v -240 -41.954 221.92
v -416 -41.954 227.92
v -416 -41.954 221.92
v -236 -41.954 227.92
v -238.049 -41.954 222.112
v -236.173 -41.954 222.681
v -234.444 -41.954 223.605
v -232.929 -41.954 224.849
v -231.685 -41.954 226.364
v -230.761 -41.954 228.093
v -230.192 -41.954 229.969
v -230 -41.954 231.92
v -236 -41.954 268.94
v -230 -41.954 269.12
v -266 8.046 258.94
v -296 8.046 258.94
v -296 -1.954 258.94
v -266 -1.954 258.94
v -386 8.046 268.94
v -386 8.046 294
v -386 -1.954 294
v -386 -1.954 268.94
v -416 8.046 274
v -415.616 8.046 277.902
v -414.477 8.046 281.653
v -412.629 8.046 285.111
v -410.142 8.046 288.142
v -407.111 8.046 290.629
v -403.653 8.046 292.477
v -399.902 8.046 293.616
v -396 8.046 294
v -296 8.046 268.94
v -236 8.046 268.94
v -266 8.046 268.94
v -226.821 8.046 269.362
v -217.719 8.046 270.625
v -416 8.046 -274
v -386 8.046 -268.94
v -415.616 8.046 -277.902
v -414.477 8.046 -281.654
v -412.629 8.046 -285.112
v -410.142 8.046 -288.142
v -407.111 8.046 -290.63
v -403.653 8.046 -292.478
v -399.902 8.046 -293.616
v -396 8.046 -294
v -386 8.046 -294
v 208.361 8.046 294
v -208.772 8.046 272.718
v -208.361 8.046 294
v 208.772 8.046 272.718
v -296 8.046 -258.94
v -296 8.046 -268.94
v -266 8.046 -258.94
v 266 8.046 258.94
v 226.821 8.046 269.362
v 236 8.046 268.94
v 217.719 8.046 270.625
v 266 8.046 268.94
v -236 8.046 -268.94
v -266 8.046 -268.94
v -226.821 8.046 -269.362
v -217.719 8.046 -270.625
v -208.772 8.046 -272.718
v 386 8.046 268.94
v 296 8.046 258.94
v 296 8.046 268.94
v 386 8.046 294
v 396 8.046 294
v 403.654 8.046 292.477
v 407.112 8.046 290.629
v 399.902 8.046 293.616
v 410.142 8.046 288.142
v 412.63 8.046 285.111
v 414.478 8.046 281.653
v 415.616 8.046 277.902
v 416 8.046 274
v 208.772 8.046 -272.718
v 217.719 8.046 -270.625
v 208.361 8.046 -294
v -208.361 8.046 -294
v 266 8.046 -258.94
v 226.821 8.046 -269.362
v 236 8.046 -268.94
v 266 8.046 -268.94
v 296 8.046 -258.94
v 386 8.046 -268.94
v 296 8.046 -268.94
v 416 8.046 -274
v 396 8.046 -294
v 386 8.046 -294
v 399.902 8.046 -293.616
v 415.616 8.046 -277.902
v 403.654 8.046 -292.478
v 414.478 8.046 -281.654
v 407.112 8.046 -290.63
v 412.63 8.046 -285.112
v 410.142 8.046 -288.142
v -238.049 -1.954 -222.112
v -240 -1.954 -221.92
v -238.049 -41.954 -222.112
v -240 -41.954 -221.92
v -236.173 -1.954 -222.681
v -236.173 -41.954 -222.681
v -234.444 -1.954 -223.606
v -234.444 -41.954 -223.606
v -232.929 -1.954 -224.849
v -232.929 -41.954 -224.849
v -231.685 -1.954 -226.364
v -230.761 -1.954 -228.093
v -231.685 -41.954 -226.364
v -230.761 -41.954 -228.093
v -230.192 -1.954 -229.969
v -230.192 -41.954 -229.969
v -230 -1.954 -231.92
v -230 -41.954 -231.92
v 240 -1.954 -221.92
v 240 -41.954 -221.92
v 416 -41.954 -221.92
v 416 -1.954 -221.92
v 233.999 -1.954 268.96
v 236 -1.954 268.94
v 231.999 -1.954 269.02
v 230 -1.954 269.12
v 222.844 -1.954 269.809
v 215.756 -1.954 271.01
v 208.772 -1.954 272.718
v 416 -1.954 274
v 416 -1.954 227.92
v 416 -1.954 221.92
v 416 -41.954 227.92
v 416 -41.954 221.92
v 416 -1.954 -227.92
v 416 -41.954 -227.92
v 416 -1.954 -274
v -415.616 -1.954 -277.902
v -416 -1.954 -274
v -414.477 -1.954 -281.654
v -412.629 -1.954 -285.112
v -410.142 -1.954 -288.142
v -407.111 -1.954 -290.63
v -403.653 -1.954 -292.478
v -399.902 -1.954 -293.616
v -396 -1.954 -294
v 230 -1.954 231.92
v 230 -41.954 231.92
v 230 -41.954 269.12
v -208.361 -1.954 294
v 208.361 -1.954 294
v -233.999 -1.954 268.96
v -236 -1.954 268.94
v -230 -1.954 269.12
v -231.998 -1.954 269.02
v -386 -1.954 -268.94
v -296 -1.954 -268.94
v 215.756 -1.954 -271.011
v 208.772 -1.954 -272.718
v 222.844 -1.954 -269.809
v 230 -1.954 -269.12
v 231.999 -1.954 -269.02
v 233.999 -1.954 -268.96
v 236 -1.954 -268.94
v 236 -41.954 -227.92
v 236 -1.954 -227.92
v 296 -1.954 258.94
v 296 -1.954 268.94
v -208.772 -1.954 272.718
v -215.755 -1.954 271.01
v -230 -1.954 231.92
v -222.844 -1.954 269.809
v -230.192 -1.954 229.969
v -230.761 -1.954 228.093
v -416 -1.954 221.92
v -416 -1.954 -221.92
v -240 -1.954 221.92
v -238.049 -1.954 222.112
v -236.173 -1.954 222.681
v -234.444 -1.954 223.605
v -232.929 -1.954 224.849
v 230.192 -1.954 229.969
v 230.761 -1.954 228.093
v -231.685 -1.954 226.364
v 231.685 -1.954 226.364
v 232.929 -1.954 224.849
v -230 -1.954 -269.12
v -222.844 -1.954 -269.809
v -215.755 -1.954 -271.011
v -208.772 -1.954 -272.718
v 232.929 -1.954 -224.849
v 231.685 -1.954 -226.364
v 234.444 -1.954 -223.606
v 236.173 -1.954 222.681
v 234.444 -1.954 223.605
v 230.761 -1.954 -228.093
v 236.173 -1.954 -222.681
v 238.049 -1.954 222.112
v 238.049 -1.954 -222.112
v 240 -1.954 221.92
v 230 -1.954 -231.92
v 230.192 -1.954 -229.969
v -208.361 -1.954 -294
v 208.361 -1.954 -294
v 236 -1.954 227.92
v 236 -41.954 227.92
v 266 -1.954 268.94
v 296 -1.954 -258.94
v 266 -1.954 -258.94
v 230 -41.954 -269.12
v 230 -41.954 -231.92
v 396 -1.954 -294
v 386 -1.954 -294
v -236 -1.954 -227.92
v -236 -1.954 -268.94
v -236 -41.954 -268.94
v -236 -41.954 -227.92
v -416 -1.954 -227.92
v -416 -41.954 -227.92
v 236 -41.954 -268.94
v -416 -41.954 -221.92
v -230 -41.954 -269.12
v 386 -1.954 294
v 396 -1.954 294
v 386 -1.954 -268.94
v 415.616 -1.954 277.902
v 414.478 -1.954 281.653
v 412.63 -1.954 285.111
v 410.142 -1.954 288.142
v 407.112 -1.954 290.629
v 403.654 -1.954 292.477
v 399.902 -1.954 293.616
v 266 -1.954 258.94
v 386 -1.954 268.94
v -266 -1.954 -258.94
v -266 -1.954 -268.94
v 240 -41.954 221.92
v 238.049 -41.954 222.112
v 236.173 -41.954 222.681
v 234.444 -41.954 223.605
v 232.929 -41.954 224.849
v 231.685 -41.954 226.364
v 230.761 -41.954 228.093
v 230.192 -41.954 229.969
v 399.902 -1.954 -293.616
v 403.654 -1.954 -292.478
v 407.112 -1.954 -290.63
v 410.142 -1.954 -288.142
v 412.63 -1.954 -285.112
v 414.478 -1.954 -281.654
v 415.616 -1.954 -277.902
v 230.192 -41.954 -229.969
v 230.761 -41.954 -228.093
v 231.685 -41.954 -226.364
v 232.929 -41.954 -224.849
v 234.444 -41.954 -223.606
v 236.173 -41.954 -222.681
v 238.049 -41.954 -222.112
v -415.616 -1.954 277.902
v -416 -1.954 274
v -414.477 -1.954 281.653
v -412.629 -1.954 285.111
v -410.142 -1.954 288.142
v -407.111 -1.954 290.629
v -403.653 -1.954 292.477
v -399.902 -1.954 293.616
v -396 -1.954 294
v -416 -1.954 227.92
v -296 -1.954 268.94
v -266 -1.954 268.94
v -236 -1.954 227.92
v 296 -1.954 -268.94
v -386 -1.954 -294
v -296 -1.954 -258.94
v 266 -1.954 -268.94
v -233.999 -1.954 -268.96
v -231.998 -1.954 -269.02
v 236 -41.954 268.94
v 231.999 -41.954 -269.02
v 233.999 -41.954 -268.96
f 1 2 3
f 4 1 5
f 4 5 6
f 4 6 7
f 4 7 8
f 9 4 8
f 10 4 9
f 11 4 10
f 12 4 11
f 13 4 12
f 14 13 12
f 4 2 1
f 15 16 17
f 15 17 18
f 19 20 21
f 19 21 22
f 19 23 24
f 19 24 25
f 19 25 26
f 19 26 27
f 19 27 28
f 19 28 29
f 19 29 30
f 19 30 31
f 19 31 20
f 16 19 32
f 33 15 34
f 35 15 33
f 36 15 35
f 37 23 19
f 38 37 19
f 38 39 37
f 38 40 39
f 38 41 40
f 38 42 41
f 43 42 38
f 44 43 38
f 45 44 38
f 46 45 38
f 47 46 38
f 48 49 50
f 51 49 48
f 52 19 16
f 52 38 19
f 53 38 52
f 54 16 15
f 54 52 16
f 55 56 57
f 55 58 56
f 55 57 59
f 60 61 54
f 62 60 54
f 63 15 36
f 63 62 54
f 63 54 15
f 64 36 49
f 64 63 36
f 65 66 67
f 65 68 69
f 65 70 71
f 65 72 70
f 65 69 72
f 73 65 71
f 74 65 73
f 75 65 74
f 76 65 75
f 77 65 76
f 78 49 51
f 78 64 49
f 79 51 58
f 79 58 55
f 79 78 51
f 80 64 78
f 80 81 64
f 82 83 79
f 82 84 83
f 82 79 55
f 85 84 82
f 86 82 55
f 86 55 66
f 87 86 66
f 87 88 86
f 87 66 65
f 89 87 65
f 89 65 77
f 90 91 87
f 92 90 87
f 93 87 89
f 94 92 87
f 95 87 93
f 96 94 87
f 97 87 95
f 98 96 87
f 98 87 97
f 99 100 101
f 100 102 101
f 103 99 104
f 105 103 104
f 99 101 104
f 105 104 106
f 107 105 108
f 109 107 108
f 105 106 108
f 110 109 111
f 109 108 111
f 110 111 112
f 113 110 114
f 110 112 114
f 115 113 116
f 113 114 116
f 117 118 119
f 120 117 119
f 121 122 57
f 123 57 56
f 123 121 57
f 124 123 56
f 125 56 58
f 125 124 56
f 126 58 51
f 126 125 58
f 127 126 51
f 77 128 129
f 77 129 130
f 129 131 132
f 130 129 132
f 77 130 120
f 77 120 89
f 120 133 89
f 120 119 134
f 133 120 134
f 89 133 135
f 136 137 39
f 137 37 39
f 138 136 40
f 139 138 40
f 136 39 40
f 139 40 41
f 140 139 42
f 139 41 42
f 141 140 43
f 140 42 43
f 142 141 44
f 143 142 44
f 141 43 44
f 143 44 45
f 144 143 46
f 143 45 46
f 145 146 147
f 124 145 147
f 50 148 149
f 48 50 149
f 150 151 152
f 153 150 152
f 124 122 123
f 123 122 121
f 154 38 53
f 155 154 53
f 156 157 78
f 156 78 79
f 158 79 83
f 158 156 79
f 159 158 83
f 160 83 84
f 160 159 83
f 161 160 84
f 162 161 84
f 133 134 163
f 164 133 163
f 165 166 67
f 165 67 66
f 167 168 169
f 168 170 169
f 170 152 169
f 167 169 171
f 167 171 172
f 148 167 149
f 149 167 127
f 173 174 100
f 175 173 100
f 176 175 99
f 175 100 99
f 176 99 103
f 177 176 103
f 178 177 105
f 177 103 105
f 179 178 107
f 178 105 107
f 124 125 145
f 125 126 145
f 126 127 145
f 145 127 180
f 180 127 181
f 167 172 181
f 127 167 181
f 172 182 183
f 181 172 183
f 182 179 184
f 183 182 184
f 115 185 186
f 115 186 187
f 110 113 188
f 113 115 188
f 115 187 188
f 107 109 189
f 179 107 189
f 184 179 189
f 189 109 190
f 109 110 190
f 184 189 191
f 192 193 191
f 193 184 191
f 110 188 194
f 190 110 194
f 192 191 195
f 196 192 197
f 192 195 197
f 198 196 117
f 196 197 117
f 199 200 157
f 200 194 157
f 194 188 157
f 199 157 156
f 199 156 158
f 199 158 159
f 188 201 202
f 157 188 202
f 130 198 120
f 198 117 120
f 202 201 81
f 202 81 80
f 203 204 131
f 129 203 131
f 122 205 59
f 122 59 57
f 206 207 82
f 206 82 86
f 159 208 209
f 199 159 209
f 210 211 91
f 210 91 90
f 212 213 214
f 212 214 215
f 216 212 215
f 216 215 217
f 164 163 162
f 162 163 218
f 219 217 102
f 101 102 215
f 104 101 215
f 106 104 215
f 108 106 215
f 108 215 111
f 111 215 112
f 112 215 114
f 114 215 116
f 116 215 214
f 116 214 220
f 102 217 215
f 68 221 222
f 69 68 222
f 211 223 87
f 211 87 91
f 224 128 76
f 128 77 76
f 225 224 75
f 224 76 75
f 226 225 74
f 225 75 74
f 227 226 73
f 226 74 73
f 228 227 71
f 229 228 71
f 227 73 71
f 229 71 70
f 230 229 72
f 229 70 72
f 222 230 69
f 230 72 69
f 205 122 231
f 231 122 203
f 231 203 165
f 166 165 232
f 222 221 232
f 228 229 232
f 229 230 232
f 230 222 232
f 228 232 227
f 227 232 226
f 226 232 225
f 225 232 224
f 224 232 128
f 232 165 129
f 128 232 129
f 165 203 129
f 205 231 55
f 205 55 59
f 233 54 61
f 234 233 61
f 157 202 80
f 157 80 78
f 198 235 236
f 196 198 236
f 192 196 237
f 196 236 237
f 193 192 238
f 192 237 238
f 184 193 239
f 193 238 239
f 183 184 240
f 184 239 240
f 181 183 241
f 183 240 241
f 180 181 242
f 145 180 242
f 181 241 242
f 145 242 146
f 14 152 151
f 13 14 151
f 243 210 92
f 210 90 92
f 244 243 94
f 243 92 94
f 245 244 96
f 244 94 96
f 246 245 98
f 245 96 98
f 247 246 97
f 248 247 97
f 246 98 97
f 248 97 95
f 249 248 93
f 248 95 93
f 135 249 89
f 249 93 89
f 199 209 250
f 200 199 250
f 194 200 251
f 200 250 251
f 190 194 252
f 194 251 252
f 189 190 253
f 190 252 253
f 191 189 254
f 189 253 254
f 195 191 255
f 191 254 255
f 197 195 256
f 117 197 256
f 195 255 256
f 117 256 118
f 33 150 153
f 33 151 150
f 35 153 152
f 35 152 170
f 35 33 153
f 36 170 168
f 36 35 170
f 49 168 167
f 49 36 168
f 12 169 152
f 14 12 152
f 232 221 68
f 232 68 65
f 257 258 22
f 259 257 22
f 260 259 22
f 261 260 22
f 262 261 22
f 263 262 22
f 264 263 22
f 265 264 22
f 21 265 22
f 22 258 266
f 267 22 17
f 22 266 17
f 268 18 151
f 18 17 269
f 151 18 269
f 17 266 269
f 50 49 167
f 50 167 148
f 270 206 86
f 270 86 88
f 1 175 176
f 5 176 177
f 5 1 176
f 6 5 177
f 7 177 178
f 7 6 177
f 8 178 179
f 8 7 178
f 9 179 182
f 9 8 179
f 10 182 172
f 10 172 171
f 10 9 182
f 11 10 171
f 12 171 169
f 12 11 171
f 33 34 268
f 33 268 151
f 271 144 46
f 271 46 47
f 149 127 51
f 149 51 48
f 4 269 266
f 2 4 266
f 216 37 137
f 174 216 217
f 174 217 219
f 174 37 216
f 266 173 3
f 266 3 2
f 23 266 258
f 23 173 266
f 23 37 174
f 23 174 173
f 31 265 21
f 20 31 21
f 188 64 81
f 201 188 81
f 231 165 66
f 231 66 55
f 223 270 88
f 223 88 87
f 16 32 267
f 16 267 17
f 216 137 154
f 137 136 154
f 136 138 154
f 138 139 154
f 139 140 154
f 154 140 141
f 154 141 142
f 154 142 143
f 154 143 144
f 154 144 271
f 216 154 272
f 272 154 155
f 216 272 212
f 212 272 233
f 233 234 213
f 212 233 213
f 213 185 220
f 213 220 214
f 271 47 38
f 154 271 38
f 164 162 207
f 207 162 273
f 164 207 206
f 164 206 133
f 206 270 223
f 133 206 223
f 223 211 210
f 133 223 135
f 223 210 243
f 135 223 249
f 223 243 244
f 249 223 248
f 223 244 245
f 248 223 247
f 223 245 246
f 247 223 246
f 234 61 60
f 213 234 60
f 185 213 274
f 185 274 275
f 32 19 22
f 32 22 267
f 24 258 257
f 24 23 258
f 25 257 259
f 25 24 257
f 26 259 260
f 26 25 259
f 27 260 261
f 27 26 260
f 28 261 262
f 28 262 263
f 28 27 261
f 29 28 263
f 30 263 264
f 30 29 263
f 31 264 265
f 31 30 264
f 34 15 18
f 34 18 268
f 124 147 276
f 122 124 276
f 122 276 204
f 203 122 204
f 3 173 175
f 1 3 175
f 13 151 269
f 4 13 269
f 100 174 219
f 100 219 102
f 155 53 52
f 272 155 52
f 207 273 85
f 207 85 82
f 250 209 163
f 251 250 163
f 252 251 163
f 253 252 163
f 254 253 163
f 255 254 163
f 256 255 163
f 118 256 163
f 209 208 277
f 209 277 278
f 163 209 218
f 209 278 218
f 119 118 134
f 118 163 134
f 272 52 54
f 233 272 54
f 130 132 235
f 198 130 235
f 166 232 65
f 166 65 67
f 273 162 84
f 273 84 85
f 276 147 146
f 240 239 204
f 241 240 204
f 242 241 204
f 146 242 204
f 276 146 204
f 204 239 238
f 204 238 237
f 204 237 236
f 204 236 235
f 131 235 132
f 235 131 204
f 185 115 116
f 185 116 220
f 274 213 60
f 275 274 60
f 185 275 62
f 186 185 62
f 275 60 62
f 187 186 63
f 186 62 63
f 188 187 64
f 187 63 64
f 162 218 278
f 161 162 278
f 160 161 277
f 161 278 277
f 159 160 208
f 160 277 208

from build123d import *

# Parameters (mm, degrees)
CROQUIS1_W               = 416
CROQUIS1_H               = 294
SALIENTE_EXTRUIR1_DEPTH  = 5
CORTAR_EXTRUIR1_DEPTH    = 255.750858684
REDONDEO1_R              = 10
SALIENTE_EXTRUIR3_DEPTH  = 20
REDONDEO2_R              = 5
REDONDEO2_OF_SIMETR_A3_R = 5
SIMETR_A4_DEPTH          = 5
SIMETR_A4_START          = -20
SIMETR_A4_2_DEPTH        = 20
ESCALA1_SCALE            = 2


# Read off the part's stored shape, not the designer's step: Simetría4
with BuildPart() as part:
    # Croquis1 → Saliente-Extruir1 (new body)
    with BuildSketch(Plane(origin=(0, 0, 0), x_dir=(1, 0, 0), z_dir=(0, 1, 0))):
        Rectangle(CROQUIS1_W, CROQUIS1_H)
    extrude(amount=SALIENTE_EXTRUIR1_DEPTH)

    # Croquis3 → Cortar-Extruir1 (cut, through all)
    with BuildSketch(Plane(origin=(0, 5, 0), x_dir=(1, 0, 0), z_dir=(0, 1, 0))):
        with BuildLine():
            Line((-193, 154.47), (-193, 134.47))
            Line((-193, 134.47), (-148, 134.47))
            Line((-148, 134.47), (-148, 129.47))
            Line((-148, 129.47), (-133, 129.47))
            Line((-133, 129.47), (-133, 134.47))
            Line((-133, 134.47), (-118, 134.47))
            ThreePointArc((-118, 134.47), (-111.127739024, 134.944531511), (-104.385922224, 136.359118837))
            Line((-104.385922224, 136.359118837), (-104, 156.355395091))
            Line((-104, 156.355395091), (-193, 156.355395091))
            Line((-193, 156.355395091), (-193, 154.47))
        make_face()
    cortar_extruir1 = extrude(amount=-CORTAR_EXTRUIR1_DEPTH, mode=Mode.SUBTRACT)

    # Simetría1: Cortar-Extruir1 across plane
    add(cortar_extruir1.mirror(Plane.XY), mode=Mode.SUBTRACT)

    # Redondeo1
    redondeo1_edges = [part.edges().sort_by_distance(p)[0] for p in [
        (-208, 2.5, -147),
        (208, 2.5, -147),
        (208, 2.5, 147),
        (-208, 2.5, 147),
    ]]
    fillet(redondeo1_edges, radius=REDONDEO1_R)

    # Croquis5 → Saliente-Extruir3 (add)
    with BuildSketch(Plane.XZ):
        Polygon((-208, 110.96), (-115, 110.96), (-115, 134.560081146), (-118, 134.47), (-118, 113.96), (-208, 113.96), align=None)
    saliente_extruir3 = extrude(amount=SALIENTE_EXTRUIR3_DEPTH)

    # Redondeo2
    redondeo2_edges = [part.edges().sort_by_distance(p)[0] for p in [
        (-115, -10, 110.96),
    ]]
    fillet(redondeo2_edges, radius=REDONDEO2_R)

    # Simetría3: Saliente-Extruir3 across plane
    add(saliente_extruir3.mirror(Plane.XY))

    # Redondeo2 of Simetría3
    redondeo2_of_simetr_a3_edges = [part.edges().sort_by_distance(p)[0] for p in [
        (-115, -10, -110.96),
    ]]
    fillet(redondeo2_of_simetr_a3_edges, radius=REDONDEO2_OF_SIMETR_A3_R)

    # Simetría4 outline → Simetría4 (cut)
    with BuildSketch(Plane(origin=(0, 0, 0), x_dir=(1, 0, 0), z_dir=(0, 1, 0))):
        with BuildLine():
            Line((148, 134.47), (193, 134.47))
            Line((193, 134.47), (193, 147))
            Line((193, 147), (104.180556361, 147))
            Line((104.180556361, 147), (104.385922224, 136.359118837))
            ThreePointArc((104.385922224, 136.359118837), (111.127739024, 134.944531511), (118, 134.47))
            Line((118, 134.47), (133, 134.47))
            Line((133, 134.47), (133, 129.47))
            Line((133, 129.47), (148, 129.47))
            Line((148, 129.47), (148, 134.47))
        make_face()
        with BuildLine():
            Line((133, -134.47), (118, -134.47))
            ThreePointArc((118, -134.47), (111.127739024, -134.944531511), (104.385922224, -136.359118837))
            Line((104.385922224, -136.359118837), (104.180556361, -147))
            Line((104.180556361, -147), (193, -147))
            Line((193, -147), (193, -134.47))
            Line((193, -134.47), (148, -134.47))
            Line((148, -134.47), (148, -129.47))
            Line((148, -129.47), (133, -129.47))
            Line((133, -129.47), (133, -134.47))
        make_face()
    extrude(amount=SIMETR_A4_DEPTH, mode=Mode.SUBTRACT)

    # Simetr_a4 2 outline → Simetr_a4 2 (add)
    with BuildSketch(Plane(origin=(0, 0, 0), x_dir=(1, 0, 0), z_dir=(0, 1, 0)).offset(SIMETR_A4_START)):
        with BuildLine():
            Line((208, -113.96), (208, -110.96))
            Line((208, -110.96), (120, -110.96))
            ThreePointArc((120, -110.96), (116.464466094, -112.424466094), (115, -115.96))
            Line((115, -115.96), (115, -134.560081146))
            Line((115, -134.560081146), (118, -134.47))
            Line((118, -134.47), (118, -113.96))
            Line((118, -113.96), (208, -113.96))
        make_face()
        with BuildLine():
            ThreePointArc((118, 134.47), (116.499323935, 134.492525361), (115, 134.560081146))
            Line((115, 134.560081146), (115, 115.96))
            ThreePointArc((115, 115.96), (116.464466094, 112.424466094), (120, 110.96))
            Line((120, 110.96), (208, 110.96))
            Line((208, 110.96), (208, 113.96))
            Line((208, 113.96), (118, 113.96))
            Line((118, 113.96), (118, 134.47))
        make_face()
    extrude(amount=SIMETR_A4_2_DEPTH)


with BuildPart() as part_1:
    # Escala1: scaled about (-0.000170943, 1.954243012, 0.000197364)
    add(part.part.scale(ESCALA1_SCALE).moved(Location((0.000170943, -1.954243012, -0.000197364))))


solid = part_1.part
